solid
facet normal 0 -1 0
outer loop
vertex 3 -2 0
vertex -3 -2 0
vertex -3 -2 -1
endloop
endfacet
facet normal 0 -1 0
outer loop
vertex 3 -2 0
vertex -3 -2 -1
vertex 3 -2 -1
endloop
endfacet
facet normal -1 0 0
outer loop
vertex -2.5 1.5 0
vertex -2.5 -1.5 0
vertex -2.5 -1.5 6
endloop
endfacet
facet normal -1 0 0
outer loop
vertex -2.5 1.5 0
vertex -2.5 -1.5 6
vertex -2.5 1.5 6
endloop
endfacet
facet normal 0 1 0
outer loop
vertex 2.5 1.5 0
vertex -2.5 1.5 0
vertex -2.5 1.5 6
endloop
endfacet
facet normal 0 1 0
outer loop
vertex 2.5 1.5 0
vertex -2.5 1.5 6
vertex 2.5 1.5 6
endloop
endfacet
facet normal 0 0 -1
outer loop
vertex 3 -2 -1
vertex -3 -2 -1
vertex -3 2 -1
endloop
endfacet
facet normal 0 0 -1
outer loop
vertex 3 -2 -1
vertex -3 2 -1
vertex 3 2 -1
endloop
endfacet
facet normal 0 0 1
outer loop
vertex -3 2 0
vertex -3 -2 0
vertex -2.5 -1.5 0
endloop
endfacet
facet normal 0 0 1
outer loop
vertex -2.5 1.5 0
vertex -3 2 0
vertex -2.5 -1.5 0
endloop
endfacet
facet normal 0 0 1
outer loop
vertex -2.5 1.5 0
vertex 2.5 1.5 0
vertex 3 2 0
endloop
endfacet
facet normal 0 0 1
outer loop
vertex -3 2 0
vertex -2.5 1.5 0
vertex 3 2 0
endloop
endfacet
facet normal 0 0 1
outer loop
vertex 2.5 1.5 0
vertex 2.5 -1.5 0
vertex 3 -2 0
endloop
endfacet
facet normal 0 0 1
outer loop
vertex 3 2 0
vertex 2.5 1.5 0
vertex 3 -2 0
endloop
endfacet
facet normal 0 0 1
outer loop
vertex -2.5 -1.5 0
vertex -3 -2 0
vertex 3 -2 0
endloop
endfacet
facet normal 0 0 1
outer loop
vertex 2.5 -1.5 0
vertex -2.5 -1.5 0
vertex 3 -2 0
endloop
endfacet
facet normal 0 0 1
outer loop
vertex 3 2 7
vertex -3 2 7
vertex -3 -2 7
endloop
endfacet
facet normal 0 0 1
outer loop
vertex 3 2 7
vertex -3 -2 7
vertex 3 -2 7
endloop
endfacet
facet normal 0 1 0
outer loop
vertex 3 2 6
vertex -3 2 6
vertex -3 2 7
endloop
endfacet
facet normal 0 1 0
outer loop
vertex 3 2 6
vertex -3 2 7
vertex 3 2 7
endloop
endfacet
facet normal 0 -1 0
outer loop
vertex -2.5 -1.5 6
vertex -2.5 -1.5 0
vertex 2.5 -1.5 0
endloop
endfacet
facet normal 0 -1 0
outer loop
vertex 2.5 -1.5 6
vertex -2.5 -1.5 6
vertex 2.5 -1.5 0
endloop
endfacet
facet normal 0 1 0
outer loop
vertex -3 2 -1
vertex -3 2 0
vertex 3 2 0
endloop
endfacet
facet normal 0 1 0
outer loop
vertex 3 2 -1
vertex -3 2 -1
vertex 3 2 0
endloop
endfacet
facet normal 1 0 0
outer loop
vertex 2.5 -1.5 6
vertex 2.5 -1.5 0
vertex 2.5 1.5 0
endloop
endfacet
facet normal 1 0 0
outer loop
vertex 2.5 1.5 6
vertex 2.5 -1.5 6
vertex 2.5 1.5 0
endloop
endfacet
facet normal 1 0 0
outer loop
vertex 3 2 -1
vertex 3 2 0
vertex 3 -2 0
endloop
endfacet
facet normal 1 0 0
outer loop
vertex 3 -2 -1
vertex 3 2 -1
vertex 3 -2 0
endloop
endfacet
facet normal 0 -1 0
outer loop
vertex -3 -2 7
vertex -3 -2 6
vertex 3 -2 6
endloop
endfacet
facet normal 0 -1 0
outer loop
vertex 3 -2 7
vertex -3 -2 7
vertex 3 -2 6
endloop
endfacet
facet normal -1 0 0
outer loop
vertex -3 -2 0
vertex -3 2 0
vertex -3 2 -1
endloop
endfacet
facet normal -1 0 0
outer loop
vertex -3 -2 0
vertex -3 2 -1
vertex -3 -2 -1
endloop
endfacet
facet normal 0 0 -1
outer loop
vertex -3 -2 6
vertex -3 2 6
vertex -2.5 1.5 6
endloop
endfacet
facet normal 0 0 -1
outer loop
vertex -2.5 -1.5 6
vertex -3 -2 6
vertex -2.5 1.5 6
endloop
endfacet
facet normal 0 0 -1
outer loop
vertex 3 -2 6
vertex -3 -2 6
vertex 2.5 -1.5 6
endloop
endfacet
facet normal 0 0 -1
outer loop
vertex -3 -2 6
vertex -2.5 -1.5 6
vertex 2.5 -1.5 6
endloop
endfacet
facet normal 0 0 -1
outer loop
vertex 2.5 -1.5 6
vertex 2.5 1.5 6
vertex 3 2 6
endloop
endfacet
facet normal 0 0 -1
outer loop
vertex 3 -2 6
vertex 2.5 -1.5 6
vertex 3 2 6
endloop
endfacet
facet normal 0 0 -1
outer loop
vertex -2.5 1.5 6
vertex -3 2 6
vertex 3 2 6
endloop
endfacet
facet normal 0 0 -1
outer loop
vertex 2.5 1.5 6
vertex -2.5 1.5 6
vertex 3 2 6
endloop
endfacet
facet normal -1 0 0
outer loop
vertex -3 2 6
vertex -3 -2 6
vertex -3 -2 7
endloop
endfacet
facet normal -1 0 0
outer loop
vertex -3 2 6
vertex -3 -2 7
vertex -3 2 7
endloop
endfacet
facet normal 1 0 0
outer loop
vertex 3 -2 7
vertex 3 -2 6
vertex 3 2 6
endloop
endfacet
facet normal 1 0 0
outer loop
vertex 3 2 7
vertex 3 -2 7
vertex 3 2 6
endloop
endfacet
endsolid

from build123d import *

# Parameters (mm, degrees)
F0_W     = 5
F0_H     = 3
F1_DEPTH = 6
F2_W     = 6
F2_H     = 4
F3_DEPTH = 1
F4_W     = 6
F4_H     = 4
F5_DEPTH = 1


with BuildPart() as f1:
    # F0 (on Top) → F1 (new body)
    with BuildSketch(Plane.XY):
        Rectangle(F0_W, F0_H)
    extrude(amount=F1_DEPTH)

    # F2 (on face) → F3 (join)
    with BuildSketch(Plane.XY.offset(6)):
        Rectangle(F2_W, F2_H)
    extrude(amount=F3_DEPTH)

    # F4 (on face) → F5 (join)
    with BuildSketch(Plane(origin=(0, 0, 0), x_dir=(1, 0, 0), z_dir=(0, 0, -1))):
        Rectangle(F4_W, F4_H)
    extrude(amount=F5_DEPTH)


solid = f1.part
